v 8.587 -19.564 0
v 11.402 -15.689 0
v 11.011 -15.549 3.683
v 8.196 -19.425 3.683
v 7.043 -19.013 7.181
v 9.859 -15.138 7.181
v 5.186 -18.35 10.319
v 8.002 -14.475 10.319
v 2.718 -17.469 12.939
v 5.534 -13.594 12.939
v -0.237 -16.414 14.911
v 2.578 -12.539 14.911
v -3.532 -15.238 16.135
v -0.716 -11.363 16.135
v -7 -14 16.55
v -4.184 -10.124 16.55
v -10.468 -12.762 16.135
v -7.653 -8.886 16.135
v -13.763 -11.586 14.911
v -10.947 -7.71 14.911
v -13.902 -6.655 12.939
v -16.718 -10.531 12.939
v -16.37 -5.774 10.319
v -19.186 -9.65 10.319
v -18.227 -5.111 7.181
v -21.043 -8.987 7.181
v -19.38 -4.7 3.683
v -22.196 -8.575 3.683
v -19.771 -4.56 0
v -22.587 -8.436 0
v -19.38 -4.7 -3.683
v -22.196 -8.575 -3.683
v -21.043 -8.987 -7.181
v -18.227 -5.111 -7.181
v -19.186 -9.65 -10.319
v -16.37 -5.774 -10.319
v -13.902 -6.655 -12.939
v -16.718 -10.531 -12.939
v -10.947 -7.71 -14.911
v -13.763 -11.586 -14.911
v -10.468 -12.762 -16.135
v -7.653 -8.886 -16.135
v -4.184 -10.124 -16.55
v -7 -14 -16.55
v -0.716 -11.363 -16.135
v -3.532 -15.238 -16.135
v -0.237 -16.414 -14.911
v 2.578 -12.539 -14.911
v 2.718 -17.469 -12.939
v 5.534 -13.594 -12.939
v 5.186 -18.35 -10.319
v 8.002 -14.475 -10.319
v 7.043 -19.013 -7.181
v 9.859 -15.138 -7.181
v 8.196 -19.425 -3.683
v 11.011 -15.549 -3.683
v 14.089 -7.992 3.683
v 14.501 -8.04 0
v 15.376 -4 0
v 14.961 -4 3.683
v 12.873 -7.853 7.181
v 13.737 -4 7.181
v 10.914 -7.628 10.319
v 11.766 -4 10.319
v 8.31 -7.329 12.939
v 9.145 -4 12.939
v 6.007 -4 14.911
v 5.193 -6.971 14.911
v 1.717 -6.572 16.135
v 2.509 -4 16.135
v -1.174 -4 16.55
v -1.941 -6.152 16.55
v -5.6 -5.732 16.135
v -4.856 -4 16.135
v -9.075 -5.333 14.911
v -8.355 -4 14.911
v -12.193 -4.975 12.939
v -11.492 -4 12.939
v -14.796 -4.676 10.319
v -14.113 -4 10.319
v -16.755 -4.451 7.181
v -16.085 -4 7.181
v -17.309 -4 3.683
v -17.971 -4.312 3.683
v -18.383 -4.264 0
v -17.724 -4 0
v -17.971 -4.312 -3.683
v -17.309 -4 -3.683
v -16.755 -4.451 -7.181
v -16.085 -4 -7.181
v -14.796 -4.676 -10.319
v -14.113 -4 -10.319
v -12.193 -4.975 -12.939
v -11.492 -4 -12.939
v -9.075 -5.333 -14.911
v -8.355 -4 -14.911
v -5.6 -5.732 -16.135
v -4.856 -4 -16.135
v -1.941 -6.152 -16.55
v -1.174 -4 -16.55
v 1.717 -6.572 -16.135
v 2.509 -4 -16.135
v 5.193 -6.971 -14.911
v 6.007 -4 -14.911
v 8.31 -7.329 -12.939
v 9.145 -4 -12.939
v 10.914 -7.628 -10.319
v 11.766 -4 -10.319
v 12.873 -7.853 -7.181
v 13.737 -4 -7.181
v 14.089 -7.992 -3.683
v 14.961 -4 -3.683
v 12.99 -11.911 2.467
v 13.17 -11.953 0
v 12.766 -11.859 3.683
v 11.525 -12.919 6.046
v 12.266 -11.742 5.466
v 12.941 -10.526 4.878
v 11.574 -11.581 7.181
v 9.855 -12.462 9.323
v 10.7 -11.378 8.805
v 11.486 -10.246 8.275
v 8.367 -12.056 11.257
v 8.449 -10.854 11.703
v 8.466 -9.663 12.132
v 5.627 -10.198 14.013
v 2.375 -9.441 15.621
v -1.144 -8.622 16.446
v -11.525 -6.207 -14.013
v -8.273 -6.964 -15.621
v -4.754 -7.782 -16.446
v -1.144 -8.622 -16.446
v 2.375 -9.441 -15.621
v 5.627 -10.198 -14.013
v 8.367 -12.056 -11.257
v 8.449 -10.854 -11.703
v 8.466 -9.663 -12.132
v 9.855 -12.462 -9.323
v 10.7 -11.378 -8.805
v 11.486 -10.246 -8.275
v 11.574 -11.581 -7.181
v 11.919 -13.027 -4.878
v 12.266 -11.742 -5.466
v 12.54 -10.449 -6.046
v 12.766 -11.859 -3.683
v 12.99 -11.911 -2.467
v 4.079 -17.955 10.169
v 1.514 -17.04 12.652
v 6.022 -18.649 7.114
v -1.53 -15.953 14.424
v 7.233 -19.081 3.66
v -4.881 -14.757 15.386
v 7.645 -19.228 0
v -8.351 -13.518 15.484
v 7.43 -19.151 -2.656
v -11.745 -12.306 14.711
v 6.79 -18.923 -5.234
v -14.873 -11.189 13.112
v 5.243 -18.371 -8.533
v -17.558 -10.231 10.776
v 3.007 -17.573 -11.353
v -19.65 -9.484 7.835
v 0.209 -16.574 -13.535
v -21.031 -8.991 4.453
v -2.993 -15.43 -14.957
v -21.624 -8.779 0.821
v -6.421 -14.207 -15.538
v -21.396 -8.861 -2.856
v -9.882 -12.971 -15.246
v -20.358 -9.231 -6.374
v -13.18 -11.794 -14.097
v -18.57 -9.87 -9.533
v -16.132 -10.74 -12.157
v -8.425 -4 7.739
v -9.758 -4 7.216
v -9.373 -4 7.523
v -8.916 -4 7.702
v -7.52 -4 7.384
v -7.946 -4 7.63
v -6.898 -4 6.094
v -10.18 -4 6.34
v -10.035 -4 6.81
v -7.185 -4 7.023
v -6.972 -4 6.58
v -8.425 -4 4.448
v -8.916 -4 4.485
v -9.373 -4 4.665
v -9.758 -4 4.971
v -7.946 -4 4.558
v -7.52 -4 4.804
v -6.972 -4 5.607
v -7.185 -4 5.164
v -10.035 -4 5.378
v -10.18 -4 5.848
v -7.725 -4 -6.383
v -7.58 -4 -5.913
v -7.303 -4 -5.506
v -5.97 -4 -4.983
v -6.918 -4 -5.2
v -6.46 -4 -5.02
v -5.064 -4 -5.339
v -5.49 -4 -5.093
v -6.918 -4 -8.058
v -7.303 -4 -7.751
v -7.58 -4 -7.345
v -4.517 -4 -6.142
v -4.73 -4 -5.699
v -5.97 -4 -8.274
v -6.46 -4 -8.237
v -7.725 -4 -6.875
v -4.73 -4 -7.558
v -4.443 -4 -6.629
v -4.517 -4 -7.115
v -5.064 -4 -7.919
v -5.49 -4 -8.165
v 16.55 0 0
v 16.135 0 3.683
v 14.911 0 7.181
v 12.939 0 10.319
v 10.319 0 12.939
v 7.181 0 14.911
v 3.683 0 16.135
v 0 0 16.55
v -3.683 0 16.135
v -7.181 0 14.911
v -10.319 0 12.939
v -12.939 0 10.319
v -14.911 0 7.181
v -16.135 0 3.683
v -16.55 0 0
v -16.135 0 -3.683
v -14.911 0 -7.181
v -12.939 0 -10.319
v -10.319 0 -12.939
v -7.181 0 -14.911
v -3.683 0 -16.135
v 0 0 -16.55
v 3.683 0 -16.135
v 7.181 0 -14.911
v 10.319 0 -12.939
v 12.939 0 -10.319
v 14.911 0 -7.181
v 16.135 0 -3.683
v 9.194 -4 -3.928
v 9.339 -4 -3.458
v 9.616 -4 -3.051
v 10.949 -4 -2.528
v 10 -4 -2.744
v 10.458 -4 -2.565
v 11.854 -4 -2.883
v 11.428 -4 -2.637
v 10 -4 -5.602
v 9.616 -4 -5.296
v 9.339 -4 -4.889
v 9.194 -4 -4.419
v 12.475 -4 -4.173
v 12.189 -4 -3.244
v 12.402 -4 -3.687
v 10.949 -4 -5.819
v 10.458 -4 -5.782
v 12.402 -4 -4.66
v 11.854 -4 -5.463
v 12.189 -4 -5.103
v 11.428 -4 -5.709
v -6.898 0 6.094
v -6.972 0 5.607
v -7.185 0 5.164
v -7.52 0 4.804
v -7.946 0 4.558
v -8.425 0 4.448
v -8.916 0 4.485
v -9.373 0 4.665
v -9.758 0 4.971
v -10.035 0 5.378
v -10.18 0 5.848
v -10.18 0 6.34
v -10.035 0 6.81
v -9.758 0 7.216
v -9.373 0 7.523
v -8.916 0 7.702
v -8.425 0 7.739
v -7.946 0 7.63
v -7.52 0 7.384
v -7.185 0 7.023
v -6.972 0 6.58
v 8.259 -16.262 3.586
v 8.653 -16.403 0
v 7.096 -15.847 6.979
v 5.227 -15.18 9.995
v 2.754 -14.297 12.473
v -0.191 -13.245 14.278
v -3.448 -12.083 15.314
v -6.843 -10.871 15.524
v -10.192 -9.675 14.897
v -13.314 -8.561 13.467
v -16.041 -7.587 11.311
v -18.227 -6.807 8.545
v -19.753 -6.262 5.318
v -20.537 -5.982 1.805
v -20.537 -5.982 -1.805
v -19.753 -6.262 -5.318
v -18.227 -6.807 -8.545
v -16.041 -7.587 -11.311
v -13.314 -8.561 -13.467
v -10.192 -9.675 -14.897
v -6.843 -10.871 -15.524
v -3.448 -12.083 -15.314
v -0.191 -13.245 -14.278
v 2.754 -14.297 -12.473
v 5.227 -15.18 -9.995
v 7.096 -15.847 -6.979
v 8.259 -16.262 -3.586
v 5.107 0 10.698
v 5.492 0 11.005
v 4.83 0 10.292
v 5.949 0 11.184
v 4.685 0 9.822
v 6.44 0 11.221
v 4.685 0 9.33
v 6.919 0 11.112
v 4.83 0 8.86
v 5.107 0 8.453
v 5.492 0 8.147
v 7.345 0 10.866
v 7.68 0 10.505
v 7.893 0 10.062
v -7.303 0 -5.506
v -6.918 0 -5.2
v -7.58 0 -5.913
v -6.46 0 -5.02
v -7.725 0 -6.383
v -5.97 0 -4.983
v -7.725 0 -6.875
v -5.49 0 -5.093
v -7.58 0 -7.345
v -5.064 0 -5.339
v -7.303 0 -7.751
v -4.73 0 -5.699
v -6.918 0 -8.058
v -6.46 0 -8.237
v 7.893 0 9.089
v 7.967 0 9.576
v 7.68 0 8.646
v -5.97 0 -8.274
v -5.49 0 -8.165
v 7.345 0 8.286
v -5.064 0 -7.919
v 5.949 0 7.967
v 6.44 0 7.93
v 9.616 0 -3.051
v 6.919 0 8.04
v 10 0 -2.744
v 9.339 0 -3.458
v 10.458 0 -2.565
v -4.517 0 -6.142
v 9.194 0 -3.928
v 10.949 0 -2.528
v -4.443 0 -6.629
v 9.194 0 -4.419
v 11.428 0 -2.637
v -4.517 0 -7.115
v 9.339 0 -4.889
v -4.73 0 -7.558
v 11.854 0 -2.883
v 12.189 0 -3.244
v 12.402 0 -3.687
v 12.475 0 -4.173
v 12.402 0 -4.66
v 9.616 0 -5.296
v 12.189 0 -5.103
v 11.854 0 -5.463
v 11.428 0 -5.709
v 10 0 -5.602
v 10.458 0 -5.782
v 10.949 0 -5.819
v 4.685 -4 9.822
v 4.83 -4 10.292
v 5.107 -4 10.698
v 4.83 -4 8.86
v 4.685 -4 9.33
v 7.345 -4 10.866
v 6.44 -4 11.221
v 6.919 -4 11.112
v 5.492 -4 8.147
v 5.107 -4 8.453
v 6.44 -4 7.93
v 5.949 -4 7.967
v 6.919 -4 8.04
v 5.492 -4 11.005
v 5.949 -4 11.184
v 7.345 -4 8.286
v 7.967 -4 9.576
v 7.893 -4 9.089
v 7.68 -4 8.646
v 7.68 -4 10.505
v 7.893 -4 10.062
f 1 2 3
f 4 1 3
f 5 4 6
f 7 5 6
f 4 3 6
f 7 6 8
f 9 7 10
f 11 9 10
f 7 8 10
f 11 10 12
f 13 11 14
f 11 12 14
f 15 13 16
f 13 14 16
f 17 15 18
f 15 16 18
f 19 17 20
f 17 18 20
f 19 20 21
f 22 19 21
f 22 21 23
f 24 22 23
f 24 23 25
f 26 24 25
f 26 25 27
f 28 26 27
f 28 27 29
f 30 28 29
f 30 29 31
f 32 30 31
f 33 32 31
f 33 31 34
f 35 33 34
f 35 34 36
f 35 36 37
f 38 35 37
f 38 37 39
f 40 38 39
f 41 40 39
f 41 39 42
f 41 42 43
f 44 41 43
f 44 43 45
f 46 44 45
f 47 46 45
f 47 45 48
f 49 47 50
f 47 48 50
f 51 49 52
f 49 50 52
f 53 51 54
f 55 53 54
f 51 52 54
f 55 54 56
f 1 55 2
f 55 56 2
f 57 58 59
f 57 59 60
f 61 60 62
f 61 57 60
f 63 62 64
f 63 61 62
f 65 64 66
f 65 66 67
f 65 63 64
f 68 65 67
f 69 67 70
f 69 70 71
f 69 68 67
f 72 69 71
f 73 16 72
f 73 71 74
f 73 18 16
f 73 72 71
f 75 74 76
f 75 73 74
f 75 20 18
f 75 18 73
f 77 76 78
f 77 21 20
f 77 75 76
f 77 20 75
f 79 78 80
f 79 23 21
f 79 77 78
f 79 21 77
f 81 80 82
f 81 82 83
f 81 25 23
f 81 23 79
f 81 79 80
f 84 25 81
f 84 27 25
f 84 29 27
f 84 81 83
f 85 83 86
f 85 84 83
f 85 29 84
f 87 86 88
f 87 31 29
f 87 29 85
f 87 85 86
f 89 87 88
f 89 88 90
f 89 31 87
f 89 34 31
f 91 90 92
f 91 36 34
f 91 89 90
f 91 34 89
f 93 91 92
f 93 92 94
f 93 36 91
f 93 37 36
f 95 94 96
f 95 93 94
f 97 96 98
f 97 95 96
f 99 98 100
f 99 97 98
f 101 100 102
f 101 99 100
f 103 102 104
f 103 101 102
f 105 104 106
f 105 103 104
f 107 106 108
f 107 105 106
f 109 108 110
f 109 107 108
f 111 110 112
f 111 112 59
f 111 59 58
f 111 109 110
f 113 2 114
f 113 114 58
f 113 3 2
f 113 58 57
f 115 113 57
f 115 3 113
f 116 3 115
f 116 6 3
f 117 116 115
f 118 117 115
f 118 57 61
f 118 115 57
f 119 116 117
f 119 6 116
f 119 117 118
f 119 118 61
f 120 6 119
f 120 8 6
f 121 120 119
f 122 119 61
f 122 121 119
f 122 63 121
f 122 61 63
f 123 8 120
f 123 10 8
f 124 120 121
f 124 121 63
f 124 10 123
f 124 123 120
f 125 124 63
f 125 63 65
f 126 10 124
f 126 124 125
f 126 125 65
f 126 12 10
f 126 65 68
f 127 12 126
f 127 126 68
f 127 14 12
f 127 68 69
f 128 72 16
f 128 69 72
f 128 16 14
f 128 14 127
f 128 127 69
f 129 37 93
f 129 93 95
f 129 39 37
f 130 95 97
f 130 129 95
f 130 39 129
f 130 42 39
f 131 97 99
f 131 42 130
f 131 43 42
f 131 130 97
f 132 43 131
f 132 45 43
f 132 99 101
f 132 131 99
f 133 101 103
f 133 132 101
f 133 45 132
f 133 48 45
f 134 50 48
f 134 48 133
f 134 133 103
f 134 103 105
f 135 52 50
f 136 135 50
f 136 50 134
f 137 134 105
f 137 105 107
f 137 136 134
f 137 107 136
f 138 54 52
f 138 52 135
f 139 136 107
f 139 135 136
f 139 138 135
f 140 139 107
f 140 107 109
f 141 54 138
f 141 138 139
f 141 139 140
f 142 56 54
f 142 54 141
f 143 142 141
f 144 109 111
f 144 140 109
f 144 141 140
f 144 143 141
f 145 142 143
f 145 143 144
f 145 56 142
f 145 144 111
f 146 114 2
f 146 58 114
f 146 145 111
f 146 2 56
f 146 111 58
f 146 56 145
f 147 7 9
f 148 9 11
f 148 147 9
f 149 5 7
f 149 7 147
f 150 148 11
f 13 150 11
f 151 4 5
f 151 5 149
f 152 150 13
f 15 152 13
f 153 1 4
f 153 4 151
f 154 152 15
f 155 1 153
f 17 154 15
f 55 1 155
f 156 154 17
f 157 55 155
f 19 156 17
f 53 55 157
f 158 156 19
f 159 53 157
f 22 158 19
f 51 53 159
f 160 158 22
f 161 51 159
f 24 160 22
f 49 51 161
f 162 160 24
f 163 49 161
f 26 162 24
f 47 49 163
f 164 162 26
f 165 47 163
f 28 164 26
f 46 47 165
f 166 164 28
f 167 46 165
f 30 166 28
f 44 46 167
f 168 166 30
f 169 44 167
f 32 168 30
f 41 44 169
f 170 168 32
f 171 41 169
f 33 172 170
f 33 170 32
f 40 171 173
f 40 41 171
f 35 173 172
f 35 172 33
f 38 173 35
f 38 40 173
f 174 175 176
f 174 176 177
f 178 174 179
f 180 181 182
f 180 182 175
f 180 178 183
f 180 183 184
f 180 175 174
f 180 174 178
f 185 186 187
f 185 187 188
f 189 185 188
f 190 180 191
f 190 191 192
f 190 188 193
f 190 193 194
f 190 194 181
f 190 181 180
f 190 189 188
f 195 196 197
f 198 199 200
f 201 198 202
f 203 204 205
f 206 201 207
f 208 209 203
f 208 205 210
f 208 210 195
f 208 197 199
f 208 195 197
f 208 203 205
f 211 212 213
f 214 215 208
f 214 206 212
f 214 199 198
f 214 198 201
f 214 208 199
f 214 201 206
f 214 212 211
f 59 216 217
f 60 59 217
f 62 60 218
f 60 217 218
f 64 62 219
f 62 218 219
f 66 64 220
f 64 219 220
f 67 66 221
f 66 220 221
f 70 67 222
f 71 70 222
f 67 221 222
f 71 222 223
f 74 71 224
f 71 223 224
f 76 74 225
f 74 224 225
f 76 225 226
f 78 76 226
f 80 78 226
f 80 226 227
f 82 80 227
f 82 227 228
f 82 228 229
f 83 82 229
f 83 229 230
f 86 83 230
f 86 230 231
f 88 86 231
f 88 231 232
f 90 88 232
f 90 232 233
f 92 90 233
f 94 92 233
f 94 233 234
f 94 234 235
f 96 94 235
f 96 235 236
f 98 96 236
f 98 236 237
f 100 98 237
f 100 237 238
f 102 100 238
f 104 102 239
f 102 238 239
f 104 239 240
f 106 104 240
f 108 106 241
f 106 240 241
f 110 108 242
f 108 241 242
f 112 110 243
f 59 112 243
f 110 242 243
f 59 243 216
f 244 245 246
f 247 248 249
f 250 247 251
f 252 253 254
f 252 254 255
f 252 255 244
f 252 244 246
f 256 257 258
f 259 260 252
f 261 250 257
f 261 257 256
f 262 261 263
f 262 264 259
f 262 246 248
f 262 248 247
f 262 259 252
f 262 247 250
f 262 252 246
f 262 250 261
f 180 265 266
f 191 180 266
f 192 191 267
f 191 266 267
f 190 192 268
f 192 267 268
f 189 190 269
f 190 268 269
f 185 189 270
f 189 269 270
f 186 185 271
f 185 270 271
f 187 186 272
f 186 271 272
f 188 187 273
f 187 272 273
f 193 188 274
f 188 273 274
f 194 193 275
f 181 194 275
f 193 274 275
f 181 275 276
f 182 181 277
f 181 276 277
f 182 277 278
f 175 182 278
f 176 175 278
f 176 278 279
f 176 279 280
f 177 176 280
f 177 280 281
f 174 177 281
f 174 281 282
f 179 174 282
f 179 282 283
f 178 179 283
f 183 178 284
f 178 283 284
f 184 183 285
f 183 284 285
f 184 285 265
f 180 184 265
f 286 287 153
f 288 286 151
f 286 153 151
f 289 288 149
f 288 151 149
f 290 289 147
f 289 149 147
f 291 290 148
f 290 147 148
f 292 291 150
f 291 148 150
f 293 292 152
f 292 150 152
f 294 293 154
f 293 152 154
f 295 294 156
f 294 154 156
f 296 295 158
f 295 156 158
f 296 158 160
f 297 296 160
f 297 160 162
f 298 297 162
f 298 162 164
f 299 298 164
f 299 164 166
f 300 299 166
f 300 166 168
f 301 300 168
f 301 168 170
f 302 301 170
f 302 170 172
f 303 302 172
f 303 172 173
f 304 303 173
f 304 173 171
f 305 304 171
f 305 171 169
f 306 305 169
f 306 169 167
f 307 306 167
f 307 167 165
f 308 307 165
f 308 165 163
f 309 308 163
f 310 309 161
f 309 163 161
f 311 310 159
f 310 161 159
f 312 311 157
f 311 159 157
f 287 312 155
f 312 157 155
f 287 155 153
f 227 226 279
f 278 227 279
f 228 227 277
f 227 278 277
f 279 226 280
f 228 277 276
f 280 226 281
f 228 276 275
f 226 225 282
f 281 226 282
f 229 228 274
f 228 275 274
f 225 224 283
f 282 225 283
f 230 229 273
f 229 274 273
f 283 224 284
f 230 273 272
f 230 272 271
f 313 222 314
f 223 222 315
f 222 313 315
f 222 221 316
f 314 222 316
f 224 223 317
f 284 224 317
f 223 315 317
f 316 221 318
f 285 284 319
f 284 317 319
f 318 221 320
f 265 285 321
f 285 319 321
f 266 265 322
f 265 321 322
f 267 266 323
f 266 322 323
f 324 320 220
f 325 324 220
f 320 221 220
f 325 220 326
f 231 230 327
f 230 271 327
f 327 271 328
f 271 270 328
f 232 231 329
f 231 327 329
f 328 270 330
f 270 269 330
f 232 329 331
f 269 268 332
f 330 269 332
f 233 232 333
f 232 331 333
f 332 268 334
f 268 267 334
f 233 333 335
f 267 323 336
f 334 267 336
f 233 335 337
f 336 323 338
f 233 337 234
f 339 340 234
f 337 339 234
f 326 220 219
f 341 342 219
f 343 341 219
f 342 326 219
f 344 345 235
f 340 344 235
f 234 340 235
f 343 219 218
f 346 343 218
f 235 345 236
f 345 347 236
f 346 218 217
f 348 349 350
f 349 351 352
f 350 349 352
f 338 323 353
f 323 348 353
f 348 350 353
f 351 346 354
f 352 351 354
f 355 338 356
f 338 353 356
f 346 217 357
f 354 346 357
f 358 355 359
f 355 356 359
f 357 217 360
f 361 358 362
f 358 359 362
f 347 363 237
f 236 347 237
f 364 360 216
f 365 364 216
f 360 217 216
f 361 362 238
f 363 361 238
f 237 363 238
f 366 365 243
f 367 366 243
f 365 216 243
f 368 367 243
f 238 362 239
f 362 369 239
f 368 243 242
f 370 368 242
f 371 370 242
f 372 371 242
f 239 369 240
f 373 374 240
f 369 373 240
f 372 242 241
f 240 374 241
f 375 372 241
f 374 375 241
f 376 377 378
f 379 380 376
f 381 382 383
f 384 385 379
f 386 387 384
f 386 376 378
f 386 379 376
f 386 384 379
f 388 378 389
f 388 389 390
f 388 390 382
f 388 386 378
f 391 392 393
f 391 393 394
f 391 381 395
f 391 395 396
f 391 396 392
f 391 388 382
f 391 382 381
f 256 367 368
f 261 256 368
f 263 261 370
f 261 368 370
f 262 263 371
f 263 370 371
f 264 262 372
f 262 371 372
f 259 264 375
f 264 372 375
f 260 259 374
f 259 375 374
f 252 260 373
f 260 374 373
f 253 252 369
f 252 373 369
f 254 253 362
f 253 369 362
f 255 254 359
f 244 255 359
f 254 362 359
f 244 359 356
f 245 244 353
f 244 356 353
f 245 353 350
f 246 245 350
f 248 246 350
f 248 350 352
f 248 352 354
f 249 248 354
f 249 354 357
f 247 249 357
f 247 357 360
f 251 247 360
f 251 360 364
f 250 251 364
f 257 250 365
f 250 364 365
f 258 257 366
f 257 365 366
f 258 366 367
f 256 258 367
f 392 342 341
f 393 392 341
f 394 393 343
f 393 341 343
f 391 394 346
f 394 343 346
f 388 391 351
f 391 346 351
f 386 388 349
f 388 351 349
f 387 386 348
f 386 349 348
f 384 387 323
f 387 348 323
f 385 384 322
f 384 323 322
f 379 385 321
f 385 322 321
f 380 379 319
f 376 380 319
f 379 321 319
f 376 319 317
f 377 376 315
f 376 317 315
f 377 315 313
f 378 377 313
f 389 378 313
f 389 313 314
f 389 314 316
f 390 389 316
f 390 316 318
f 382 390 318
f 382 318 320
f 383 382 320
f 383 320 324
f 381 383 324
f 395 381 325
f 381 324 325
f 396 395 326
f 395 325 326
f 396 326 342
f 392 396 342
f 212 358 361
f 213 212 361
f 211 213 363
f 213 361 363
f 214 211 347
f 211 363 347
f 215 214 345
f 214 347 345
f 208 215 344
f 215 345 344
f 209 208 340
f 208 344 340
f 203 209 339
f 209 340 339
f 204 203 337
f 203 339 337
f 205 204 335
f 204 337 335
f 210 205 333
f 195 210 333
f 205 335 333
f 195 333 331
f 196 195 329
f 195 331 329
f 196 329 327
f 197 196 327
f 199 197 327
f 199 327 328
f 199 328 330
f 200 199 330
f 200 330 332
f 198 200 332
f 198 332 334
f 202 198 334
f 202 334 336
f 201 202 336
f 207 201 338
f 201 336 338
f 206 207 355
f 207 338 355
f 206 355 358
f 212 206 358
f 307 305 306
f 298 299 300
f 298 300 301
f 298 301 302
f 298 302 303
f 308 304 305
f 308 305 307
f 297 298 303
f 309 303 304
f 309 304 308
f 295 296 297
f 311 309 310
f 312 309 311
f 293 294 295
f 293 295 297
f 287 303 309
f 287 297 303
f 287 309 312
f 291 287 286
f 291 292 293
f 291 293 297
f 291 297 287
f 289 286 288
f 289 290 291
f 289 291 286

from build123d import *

# Parameters (mm, degrees)
SKETCH001_R     = 16.55
SKETCH002_R     = 1.65
POCKET_DEPTH    = 4
SKETCH003_R     = 15.55
POCKET001_DEPTH = 3


with BuildPart() as part:
    # AdditivePipe: sweep along a path in Sketch
    with BuildLine(Plane.XY) as additivepipe_path:
        Line((-7, -14), (-4.184254, -10.124458))
        ThreePointArc((-4.184254, -10.124458), (-2.415843, -7.191583), (-1.173735, -4))
        Line((-1.173735, -4), (0, 0))
    # Sketch001 → AdditivePipe (sweep)
    with BuildSketch(Plane.XZ):
        Circle(SKETCH001_R)
    sweep(path=additivepipe_path.line)

    # Sketch002 (on Face5 of AdditivePipe) → Pocket (cut)
    with BuildSketch(Plane(origin=(0, 0, 0), x_dir=(1, 0, 0), z_dir=(0, 1, 0))):
        with Locations((-8.548413, -6.093699)):
            Circle(SKETCH002_R)
        with Locations((-6.093229, 6.62862)):
            Circle(SKETCH002_R)
        with Locations((10.825222, 4.173435)):
            Circle(SKETCH002_R)
        with Locations((6.316611, -9.575596)):
            Circle(SKETCH002_R)
    extrude(amount=-POCKET_DEPTH, mode=Mode.SUBTRACT)

    # Sketch003 (on Face1 of Pocket) → Pocket001 (cut)
    with BuildSketch(Plane(origin=(-5.2243, -14.633924, 0), x_dir=(0.941785, -0.336216, 0), z_dir=(-0.336216, -0.941785, 0))):
        with Locations((-1.885463, 0)):
            Circle(SKETCH003_R)
    extrude(amount=-POCKET001_DEPTH, mode=Mode.SUBTRACT)


solid = part.part
